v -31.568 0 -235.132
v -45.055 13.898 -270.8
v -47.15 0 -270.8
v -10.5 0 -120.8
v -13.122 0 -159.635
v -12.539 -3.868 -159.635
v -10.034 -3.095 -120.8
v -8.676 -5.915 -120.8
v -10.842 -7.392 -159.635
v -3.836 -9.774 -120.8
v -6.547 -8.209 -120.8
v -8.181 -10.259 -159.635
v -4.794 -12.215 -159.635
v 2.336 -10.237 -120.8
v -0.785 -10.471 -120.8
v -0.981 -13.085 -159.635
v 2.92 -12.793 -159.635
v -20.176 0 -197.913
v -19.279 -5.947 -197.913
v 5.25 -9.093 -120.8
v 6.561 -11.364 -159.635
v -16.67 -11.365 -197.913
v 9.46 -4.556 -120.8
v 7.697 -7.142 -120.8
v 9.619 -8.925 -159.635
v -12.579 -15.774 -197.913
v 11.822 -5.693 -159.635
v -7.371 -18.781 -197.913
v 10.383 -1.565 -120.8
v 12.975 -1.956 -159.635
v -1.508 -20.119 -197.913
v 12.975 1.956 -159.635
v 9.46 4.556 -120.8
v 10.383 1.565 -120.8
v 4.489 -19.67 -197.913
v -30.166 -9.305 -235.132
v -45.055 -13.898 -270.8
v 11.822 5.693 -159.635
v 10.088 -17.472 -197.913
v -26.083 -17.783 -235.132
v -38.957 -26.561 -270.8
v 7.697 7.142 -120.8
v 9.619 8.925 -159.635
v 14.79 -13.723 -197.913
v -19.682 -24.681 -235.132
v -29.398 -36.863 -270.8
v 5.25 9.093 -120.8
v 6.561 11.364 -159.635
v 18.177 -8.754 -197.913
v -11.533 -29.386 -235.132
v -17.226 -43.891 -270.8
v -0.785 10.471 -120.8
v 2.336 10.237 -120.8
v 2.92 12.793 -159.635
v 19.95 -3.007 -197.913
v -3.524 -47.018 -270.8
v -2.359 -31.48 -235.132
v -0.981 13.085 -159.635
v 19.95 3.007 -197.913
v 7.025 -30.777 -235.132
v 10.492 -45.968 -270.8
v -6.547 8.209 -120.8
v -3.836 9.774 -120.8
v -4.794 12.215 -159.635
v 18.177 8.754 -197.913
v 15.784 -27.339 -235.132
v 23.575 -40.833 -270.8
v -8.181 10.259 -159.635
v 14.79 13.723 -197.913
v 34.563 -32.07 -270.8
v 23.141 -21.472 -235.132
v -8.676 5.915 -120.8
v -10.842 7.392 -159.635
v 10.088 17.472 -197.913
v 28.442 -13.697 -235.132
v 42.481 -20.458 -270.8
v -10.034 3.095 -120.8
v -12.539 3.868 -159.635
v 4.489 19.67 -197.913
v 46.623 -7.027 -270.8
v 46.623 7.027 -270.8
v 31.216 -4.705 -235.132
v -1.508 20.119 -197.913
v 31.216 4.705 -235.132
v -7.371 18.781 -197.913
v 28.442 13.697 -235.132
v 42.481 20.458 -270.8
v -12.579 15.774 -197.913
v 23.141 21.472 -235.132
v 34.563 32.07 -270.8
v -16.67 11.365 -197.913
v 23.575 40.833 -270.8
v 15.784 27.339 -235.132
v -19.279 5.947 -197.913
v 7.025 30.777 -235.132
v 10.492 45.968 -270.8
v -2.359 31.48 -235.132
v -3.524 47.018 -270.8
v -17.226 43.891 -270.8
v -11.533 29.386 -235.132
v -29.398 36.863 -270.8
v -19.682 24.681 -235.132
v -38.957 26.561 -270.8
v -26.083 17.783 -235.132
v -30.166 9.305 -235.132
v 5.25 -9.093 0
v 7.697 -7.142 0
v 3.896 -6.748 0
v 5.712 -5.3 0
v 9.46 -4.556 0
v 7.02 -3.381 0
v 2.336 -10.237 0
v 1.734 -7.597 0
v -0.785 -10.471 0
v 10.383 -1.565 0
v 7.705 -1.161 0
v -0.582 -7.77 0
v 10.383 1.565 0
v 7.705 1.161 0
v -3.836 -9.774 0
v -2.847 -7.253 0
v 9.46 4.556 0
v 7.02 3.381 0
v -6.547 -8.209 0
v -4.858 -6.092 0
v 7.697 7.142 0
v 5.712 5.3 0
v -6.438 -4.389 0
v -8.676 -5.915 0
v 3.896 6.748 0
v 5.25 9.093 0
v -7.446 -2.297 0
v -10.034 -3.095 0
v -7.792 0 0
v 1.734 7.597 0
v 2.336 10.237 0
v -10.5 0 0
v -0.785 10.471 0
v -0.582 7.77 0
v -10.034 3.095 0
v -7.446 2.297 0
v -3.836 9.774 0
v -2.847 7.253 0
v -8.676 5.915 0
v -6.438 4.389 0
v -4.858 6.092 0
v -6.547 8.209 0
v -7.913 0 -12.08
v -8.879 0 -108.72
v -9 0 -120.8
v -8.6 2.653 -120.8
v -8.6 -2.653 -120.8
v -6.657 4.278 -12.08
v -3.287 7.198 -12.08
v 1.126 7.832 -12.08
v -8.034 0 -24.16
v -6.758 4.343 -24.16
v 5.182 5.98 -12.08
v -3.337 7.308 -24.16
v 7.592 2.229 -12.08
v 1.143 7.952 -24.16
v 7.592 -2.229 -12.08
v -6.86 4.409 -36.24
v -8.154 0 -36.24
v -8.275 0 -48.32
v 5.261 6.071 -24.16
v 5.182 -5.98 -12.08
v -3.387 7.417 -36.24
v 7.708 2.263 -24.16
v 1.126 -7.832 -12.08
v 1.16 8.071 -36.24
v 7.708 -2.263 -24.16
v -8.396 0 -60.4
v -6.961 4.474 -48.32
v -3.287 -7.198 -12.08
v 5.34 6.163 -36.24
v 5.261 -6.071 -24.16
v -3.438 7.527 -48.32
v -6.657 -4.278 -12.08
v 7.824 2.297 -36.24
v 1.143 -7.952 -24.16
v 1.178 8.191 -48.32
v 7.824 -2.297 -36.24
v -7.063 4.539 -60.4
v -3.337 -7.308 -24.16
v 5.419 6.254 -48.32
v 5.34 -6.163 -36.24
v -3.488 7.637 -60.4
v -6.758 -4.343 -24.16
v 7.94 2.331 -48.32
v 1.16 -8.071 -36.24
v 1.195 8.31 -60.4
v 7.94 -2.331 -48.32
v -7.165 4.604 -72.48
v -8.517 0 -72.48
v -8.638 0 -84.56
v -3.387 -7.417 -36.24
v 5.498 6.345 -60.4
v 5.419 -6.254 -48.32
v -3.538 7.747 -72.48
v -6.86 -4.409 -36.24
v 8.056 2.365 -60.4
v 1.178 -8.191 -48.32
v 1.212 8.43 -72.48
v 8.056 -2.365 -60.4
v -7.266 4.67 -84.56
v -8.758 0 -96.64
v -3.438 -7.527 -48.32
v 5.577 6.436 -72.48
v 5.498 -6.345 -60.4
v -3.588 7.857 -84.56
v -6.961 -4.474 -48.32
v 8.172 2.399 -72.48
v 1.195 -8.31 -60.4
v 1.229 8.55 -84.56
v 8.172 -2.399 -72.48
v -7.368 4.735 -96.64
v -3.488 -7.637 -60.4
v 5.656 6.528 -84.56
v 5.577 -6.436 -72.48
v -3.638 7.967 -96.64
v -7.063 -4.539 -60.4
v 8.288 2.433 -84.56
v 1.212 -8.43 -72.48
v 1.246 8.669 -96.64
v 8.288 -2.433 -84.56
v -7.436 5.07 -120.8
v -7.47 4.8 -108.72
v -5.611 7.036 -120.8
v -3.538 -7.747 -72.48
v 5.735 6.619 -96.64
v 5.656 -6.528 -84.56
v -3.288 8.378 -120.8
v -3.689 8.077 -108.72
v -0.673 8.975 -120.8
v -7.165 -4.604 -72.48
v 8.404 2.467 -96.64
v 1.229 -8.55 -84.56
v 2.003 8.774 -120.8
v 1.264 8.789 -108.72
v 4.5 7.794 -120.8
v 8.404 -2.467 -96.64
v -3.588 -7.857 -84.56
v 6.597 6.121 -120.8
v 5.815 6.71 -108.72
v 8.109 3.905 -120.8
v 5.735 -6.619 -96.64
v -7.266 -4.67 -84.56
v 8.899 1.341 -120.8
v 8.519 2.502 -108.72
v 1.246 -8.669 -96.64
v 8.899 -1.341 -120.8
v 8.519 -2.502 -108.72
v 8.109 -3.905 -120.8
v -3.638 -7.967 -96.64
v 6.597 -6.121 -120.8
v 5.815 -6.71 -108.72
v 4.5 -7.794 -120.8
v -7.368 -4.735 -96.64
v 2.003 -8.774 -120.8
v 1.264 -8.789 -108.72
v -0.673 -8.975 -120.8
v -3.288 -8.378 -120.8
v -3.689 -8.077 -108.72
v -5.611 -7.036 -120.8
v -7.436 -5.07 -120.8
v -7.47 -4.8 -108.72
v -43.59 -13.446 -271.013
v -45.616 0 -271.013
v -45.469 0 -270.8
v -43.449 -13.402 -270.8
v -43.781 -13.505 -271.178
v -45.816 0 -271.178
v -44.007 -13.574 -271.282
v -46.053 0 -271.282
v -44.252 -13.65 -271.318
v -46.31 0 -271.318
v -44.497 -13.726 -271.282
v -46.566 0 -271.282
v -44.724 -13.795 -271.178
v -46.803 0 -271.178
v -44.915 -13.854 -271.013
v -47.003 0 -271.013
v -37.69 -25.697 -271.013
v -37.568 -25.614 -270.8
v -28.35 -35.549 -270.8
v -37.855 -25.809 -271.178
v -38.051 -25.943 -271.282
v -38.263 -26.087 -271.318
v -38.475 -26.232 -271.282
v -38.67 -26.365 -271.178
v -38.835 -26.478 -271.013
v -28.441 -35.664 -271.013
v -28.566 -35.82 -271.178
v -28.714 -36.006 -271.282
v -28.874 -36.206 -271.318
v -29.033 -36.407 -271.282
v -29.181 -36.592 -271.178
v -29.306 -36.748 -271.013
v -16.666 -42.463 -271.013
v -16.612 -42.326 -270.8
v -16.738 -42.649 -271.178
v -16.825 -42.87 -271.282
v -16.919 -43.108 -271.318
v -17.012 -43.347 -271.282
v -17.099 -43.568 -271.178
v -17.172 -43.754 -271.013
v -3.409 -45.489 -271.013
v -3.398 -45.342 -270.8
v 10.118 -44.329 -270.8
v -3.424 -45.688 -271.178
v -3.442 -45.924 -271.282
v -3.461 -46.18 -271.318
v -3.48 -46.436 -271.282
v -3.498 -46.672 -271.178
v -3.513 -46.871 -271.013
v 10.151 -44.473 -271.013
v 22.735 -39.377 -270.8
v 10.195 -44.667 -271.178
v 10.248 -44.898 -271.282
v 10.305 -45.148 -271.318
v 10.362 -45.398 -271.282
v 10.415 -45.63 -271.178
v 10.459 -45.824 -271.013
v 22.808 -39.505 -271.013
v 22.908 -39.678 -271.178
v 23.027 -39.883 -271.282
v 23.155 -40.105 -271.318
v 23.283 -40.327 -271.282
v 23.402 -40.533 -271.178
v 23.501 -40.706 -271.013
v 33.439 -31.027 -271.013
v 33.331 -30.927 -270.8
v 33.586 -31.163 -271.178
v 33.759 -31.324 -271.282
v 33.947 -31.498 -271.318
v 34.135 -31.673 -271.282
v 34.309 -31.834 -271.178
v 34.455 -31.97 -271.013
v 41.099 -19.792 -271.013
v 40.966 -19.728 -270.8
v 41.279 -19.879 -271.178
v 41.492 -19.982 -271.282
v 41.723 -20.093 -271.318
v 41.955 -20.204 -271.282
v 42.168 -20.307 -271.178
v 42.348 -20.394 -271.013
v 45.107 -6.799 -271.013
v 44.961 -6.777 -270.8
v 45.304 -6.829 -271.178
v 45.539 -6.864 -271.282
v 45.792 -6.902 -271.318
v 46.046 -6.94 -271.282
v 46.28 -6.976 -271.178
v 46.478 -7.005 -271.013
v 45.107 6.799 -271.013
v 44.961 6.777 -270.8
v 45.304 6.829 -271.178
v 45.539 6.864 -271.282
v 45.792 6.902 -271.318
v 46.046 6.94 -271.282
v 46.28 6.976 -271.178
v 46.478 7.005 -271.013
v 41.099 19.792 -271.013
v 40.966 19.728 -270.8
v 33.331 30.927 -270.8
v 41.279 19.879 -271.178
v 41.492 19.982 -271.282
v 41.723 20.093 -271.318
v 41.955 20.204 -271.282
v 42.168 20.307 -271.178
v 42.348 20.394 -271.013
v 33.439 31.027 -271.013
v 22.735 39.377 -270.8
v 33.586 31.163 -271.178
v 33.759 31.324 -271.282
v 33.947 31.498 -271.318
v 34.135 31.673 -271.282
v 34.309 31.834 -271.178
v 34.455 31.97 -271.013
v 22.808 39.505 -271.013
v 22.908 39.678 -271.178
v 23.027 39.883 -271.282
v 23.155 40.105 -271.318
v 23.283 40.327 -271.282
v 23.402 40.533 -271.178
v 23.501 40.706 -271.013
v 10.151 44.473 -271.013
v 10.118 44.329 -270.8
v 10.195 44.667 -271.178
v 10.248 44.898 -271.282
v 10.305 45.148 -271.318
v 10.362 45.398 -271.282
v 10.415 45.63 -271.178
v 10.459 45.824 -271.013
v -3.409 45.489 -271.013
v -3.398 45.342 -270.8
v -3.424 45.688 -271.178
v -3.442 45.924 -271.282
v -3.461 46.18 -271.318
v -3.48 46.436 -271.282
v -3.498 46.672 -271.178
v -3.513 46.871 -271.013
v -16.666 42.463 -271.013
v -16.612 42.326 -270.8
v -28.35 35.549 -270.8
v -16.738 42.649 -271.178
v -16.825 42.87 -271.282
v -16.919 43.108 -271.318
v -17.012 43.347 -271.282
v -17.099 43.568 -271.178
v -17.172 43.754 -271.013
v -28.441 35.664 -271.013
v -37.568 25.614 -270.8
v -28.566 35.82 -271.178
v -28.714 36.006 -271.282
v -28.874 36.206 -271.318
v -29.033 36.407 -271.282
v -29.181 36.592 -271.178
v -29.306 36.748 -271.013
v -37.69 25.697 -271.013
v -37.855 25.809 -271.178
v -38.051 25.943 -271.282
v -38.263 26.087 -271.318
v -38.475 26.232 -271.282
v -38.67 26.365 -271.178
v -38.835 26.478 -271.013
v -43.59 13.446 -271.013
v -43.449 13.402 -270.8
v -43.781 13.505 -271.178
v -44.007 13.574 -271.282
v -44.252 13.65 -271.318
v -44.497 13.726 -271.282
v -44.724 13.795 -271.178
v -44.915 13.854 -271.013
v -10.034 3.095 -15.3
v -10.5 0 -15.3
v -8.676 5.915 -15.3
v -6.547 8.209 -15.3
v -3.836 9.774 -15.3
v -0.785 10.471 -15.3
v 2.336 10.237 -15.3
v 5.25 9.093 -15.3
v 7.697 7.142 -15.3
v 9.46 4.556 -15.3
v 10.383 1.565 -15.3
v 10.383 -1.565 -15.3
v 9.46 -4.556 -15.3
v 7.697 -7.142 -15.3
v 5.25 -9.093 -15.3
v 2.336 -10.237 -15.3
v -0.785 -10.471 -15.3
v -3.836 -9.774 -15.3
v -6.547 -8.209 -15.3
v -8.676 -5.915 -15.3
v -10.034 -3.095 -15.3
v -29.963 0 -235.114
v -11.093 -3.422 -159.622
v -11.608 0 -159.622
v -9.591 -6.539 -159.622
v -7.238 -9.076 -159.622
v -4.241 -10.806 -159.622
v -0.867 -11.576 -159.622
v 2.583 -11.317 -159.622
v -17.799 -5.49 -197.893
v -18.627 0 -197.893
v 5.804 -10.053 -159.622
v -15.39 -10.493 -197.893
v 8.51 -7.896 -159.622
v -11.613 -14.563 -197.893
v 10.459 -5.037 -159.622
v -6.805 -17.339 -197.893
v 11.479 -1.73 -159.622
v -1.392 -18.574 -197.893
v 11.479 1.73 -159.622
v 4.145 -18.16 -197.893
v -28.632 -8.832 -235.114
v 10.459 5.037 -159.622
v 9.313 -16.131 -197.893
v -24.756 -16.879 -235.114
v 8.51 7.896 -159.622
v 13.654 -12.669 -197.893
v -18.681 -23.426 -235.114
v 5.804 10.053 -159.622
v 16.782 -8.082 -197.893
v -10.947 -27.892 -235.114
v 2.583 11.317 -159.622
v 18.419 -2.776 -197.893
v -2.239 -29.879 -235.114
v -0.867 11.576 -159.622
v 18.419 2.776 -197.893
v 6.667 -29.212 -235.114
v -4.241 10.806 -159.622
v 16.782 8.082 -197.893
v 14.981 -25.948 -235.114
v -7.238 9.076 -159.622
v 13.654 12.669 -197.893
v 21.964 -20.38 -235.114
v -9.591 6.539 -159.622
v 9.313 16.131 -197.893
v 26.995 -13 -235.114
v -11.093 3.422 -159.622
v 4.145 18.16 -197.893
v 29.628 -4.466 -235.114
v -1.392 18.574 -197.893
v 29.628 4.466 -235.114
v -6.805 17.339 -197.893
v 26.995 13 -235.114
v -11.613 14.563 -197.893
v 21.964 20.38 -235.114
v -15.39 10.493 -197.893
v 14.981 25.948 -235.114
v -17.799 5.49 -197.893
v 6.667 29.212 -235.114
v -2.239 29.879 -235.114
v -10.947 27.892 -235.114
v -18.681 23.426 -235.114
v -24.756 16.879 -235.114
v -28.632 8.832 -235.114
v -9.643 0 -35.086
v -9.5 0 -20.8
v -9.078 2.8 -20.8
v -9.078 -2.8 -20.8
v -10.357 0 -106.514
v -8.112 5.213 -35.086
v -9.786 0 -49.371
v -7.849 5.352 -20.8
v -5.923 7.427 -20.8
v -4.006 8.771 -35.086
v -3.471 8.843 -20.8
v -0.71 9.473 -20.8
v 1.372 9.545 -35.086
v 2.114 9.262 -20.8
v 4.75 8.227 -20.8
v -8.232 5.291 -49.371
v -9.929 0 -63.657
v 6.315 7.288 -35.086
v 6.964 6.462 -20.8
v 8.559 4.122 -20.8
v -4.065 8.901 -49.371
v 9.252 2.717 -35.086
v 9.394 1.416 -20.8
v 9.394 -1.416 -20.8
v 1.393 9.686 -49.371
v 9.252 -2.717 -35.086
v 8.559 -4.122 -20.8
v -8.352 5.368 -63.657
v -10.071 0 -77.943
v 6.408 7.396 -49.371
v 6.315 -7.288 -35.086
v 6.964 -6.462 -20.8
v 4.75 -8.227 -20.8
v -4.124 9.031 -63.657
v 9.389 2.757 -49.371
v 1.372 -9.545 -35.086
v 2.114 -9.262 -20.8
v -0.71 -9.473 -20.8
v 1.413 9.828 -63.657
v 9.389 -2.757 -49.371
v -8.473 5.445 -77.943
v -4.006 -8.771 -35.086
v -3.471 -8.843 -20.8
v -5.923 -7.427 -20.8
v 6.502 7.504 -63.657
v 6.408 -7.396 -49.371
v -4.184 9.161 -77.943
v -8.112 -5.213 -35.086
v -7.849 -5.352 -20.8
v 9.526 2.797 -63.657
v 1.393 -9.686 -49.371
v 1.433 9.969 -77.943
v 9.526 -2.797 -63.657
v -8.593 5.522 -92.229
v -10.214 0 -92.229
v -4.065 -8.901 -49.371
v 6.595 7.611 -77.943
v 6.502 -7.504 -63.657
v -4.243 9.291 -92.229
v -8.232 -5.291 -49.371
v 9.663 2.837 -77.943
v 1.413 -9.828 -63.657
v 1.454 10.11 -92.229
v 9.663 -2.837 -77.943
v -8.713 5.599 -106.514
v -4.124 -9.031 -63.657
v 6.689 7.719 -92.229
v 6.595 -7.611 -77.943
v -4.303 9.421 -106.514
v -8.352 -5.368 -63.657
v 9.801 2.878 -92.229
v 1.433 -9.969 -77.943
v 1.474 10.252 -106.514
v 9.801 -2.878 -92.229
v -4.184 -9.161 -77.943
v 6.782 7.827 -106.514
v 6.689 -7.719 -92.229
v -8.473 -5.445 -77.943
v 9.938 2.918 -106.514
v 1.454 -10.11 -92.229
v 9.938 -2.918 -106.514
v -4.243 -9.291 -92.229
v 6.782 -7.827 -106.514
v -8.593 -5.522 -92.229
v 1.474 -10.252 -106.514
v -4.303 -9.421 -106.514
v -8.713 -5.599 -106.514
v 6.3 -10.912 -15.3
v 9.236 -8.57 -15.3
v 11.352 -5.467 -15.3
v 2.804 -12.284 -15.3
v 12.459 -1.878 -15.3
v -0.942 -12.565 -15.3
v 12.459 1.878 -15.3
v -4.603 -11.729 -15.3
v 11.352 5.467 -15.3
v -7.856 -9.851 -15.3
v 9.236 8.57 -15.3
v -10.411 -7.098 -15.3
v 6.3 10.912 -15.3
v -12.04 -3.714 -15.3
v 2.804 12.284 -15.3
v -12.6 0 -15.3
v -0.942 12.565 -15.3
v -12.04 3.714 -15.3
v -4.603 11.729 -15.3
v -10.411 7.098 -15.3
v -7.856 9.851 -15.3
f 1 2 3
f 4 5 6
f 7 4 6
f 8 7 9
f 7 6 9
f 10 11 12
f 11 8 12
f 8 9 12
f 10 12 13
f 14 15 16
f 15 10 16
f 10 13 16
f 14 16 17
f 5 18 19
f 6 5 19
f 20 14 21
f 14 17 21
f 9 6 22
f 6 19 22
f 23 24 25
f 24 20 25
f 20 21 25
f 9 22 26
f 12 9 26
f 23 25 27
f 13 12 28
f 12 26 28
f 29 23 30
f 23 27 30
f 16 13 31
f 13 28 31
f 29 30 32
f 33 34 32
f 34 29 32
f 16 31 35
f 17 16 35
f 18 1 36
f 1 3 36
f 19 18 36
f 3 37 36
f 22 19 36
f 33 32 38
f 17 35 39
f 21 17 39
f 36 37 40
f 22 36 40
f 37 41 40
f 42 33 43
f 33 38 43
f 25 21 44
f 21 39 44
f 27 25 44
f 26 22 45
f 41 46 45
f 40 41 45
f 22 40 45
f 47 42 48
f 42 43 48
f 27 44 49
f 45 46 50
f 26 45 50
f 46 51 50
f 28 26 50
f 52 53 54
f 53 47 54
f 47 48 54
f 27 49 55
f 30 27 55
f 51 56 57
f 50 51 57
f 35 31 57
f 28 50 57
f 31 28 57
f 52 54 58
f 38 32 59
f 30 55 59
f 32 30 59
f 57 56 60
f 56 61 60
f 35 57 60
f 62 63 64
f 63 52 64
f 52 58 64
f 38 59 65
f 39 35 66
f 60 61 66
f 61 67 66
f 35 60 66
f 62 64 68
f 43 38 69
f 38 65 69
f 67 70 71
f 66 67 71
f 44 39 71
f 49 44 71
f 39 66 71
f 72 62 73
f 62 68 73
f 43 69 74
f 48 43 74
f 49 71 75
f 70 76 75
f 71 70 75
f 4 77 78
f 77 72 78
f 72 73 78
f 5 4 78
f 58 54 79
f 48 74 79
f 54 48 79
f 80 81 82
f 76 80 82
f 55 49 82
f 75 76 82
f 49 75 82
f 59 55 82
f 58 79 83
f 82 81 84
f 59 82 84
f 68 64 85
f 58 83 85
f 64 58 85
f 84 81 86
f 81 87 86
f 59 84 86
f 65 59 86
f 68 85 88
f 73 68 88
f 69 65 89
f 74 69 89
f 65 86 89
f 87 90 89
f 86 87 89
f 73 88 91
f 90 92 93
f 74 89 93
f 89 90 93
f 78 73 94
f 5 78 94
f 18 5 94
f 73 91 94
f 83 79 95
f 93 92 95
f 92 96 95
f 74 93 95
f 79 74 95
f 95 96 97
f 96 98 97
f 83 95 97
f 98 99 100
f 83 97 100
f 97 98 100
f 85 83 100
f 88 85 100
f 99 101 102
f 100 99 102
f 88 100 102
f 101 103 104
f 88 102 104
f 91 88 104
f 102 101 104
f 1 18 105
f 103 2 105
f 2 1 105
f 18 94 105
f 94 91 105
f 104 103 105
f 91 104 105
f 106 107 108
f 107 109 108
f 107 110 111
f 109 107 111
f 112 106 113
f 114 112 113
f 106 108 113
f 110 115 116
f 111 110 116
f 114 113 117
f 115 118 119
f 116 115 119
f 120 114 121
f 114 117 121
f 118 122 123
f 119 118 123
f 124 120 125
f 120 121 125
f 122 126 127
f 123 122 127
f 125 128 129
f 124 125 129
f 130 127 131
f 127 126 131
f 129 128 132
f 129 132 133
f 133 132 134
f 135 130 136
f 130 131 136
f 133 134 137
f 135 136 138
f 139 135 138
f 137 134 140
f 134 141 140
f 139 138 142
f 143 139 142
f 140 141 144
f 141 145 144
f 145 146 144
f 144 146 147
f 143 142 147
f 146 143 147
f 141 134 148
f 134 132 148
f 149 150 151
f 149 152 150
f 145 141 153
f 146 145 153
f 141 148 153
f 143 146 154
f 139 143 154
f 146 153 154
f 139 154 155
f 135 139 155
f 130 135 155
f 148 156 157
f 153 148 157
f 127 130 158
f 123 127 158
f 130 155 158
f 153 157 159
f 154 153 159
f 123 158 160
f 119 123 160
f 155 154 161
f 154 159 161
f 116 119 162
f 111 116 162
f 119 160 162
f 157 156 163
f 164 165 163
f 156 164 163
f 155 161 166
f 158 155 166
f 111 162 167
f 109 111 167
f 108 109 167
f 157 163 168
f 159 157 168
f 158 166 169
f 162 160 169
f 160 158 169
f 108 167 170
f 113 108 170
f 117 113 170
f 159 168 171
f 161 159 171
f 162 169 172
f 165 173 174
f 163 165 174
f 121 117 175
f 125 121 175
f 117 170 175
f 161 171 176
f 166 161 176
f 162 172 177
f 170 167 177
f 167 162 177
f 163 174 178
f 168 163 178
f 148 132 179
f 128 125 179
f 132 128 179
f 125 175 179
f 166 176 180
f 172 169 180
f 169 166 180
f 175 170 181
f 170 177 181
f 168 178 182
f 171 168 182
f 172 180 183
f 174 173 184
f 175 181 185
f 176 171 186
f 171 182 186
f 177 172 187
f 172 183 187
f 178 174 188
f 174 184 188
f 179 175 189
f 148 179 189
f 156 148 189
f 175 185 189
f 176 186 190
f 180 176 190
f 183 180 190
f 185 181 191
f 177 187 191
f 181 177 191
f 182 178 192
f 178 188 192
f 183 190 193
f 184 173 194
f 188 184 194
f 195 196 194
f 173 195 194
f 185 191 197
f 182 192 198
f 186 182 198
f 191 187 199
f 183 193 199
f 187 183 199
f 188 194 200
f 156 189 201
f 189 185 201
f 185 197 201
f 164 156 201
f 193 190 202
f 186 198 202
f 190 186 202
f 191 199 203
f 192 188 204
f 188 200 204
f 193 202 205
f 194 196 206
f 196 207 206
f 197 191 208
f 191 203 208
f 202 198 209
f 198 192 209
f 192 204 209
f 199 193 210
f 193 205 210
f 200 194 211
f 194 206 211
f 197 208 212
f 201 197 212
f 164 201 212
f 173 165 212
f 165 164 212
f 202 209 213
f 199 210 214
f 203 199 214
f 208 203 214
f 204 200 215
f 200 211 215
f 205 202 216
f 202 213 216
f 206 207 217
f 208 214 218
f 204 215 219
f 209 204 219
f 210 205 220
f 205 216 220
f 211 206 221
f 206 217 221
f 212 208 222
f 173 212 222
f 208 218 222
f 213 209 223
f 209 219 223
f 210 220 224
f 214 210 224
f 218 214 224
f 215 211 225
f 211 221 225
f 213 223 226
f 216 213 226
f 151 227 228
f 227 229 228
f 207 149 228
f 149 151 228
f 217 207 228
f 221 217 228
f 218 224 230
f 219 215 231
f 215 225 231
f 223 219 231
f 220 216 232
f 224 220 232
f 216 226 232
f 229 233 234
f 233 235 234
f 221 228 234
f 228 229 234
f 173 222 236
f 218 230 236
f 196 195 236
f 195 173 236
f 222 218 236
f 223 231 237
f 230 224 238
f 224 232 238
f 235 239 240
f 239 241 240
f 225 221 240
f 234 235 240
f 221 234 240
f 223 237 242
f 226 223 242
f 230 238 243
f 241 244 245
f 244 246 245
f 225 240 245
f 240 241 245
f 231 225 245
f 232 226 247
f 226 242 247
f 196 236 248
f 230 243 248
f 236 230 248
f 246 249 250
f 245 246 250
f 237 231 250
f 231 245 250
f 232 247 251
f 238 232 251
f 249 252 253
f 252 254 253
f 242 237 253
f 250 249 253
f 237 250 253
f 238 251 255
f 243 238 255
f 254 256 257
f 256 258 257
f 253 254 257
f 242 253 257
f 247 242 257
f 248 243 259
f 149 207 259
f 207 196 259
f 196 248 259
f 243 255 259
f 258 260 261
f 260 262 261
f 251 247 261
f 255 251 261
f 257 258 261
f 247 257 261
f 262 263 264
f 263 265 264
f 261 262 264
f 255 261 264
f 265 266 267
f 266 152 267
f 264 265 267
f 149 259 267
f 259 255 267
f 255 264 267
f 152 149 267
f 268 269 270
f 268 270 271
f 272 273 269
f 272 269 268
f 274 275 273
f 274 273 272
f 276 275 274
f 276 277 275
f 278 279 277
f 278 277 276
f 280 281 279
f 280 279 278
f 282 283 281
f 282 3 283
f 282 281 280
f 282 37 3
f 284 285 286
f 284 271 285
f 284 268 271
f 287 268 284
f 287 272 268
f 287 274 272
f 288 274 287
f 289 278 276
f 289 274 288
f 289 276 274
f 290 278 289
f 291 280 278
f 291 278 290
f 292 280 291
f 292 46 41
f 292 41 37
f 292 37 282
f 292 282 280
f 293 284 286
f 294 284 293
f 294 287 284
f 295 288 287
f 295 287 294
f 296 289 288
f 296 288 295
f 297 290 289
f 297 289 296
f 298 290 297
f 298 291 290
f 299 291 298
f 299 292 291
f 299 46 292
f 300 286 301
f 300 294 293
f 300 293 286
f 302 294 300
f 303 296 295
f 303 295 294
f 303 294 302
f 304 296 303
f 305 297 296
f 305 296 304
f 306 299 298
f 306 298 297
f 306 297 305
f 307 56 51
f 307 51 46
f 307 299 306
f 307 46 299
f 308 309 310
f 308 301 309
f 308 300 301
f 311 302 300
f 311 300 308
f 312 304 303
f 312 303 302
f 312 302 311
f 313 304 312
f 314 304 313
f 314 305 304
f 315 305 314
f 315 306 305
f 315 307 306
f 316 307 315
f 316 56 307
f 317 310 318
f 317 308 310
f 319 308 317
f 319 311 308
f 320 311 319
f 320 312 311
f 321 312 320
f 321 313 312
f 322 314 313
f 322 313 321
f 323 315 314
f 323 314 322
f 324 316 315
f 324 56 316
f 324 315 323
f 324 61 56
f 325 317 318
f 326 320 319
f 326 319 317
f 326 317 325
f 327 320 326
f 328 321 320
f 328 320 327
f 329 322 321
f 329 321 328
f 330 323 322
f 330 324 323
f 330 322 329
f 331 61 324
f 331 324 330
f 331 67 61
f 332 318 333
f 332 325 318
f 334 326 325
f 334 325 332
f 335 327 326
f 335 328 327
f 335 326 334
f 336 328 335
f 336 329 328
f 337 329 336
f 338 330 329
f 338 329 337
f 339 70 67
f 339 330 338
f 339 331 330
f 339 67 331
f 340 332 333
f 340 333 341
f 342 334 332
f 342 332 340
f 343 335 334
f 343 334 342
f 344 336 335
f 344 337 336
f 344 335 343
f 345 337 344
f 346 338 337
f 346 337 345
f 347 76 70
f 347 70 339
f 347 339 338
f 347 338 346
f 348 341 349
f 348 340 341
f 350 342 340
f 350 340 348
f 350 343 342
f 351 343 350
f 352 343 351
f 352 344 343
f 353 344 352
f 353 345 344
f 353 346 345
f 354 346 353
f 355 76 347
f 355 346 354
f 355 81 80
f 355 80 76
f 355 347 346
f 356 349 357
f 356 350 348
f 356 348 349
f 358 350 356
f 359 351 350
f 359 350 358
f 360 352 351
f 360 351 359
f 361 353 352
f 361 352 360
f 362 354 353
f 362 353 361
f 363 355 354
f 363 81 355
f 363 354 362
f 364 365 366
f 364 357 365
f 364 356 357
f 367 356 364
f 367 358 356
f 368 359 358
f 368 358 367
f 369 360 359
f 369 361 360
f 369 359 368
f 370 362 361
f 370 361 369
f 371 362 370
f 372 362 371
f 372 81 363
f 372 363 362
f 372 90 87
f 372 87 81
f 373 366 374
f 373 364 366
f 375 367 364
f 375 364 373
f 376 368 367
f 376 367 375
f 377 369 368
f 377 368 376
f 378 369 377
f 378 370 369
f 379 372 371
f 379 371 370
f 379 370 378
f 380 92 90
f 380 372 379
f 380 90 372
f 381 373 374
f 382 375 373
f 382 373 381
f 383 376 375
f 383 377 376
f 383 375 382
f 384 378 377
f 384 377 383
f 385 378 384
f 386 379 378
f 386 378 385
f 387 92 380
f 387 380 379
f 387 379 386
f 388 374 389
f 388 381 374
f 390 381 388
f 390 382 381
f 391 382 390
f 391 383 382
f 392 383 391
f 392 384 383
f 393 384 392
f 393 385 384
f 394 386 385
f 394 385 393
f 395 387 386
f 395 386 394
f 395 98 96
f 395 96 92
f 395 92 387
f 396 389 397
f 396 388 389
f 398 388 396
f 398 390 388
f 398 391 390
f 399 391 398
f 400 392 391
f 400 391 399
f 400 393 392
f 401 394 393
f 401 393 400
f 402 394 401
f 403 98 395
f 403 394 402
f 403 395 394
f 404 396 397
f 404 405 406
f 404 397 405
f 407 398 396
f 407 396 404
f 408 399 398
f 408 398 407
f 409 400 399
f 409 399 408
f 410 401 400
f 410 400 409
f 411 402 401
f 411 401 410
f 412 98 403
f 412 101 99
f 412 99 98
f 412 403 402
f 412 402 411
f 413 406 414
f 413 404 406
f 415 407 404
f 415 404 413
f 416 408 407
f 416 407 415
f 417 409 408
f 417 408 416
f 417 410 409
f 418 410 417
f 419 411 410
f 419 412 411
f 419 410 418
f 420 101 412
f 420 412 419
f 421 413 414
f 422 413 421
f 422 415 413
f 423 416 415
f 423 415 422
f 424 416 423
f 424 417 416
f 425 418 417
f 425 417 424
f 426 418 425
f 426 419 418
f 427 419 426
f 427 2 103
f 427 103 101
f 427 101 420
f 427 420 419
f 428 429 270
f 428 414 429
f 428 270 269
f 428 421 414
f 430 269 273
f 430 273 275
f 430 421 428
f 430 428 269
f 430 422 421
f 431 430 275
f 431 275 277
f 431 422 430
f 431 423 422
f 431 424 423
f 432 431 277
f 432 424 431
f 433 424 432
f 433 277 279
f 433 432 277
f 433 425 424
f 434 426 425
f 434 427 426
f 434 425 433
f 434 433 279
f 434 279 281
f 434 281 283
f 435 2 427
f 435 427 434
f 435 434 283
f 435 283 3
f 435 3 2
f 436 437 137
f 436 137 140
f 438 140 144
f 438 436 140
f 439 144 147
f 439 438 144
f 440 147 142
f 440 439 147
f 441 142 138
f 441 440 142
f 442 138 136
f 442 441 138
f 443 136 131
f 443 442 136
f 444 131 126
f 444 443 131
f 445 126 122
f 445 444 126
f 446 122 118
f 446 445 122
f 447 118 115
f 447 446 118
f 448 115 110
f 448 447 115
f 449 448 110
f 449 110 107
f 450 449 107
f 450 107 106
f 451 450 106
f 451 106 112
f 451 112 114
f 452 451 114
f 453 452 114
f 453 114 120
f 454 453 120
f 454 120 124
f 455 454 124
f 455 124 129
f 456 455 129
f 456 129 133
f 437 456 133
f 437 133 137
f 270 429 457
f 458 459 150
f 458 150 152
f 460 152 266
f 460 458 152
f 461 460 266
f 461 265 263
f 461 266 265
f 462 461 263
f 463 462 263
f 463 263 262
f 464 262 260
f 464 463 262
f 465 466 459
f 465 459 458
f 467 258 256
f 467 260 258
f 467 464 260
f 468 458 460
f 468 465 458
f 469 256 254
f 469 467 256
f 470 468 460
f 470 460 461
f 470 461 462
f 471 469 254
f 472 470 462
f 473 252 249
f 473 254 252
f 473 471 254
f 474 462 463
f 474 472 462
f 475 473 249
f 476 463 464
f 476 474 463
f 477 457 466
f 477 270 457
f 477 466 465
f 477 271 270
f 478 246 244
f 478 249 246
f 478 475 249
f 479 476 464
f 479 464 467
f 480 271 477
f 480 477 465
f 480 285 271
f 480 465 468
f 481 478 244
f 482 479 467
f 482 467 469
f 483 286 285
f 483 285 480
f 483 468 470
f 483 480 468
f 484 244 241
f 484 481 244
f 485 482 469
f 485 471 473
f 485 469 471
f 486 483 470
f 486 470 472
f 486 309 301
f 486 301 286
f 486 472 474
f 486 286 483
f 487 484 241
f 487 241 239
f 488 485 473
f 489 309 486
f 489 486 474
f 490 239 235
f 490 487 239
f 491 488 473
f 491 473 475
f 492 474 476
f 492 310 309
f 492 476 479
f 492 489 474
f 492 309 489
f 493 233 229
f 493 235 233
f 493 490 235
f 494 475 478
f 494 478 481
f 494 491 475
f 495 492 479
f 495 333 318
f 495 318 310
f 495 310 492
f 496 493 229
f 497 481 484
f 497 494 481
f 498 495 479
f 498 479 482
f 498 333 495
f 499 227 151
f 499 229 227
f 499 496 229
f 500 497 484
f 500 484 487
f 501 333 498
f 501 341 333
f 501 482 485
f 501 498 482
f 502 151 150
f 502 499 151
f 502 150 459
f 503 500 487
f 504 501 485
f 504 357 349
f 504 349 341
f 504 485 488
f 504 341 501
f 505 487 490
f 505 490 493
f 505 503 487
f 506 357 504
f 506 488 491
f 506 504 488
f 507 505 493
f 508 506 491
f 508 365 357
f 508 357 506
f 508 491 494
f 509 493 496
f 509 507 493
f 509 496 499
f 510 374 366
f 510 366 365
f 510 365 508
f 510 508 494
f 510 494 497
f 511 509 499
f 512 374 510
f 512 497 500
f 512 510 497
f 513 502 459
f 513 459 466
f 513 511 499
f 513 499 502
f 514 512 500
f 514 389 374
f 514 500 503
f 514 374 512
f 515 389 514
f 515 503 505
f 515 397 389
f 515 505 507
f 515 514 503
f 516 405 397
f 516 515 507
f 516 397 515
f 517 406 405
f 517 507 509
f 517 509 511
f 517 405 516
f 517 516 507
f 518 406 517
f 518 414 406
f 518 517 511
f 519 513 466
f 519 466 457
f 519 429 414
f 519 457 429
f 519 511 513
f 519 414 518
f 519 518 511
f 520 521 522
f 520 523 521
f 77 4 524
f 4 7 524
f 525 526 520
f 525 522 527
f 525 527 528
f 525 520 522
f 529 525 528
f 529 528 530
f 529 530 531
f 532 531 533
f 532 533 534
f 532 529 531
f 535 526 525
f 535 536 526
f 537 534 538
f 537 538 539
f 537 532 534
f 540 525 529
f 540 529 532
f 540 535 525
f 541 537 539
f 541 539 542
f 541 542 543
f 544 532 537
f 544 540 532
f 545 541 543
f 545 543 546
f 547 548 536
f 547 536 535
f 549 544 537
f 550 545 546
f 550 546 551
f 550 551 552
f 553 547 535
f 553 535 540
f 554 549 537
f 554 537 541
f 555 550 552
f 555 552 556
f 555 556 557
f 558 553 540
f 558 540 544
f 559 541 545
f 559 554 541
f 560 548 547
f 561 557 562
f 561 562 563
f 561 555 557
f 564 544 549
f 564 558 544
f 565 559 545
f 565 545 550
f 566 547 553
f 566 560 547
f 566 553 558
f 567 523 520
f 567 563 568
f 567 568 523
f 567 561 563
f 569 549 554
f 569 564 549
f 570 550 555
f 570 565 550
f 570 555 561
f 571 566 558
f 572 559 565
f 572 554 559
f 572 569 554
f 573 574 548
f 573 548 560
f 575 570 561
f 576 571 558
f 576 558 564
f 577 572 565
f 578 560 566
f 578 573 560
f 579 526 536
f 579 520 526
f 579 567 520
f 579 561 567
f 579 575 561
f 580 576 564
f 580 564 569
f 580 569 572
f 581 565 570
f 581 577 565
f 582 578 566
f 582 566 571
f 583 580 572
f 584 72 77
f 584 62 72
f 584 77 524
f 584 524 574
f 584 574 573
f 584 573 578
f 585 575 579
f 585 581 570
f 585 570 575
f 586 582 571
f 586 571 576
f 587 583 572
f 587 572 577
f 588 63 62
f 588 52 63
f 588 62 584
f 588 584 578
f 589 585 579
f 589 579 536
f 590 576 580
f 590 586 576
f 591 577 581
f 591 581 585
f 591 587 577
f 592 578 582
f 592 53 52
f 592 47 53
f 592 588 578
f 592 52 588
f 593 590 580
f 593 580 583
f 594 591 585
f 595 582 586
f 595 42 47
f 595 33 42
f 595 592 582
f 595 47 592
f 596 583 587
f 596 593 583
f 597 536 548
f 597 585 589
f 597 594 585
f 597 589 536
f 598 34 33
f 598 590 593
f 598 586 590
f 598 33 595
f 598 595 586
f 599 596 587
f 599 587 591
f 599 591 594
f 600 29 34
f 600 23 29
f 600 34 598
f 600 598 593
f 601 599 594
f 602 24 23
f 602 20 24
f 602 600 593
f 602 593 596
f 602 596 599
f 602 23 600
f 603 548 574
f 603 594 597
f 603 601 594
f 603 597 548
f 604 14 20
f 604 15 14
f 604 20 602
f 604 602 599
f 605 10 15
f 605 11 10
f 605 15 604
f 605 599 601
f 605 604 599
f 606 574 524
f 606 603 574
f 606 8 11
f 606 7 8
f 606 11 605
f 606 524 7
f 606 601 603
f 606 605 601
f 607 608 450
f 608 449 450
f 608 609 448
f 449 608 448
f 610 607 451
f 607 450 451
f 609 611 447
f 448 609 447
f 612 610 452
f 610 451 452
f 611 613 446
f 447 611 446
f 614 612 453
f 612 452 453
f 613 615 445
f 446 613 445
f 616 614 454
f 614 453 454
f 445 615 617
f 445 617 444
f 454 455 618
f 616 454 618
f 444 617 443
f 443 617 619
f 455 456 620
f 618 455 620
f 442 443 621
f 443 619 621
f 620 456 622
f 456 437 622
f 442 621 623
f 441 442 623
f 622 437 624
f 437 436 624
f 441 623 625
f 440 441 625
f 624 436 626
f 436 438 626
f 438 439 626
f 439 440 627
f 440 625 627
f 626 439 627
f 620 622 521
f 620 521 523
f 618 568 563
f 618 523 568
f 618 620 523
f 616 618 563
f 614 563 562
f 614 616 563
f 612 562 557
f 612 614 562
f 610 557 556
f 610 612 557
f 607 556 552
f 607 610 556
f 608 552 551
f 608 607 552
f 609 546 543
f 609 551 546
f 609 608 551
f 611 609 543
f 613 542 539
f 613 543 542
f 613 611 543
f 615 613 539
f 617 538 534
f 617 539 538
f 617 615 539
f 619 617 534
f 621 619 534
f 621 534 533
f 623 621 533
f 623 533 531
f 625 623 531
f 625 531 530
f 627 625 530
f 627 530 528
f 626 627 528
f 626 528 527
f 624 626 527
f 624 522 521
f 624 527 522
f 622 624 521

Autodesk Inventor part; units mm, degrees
ref_plane "YZ Plane" through (0, 0, 0) normal (1, 0, 0) x (0, 1, 0)
ref_plane "XZ Plane" through (0, 0, 0) normal (0, 1, 0) x (-1, 0, 0)
ref_plane "XY Plane" through (0, 0, 0) normal (0, 0, 1) x (1, 0, 0)
sketch "Sketch1" plane through (0, 0, 0) normal (0, 1, 0) x (-1, 0, 0)
  line L0 (0, 0) -> (0, -270.8) construction
  line L1 (0, -270.8) -> (47.15, -270.8) construction
  line L2 (0, -120.8) -> (10.5, -120.8) construction
  line L3 (0, -20.8) -> (9.5, -20.8) construction
  line L4 (0, -15.3) -> (12.6, -15.3) construction
  line L5 (0, 0) -> (10.5, 0) construction
  line L6 (10.5, 0) -> (10.5, -15.3)
  line L7 (10.5, -15.3) -> (12.6, -15.3)
  line L8 (12.6, -15.3) -> (9.5, -20.8)
  line L9 (10.5, -120.8) -> (9.5, -20.8)
  arc A0 (10.5, -120.8) -> (47.15, -270.8) centre (349.6639, -117.4084) ccw
  arc A1 (8.9999, -120.8) -> (45.4691, -270.8) centre (349.6639, -117.4084) ccw
  line L10 (8.9999, -120.8) -> (7.7919, 0)
  line L11 (10.5, 0) -> (7.7919, 0)
  arc A2 (45.4691, -270.8) -> (47.15, -270.8) centre (46.3096, -270.3762) ccw
  dimension "d0" = 15.3
  dimension "d1" = 5.5
  dimension "d2" = 100
  dimension "d3" = 150
  dimension "d4" = 47.15
  dimension "d5" = 10.5
  dimension "d6" = 9.5
  dimension "d7" = 12.6
  dimension "d8" = 10.5
  dimension "d9" = 1.5
revolve "Revolution1" add sketch "Sketch1" angle 360 about axis through (0, 0, 0) along (0, 0, -1)
thread "Thread1" size "M22x3" class "6g" standard "ANSI Metric M Profile" full length
equation "\"d0\" = Mount_Length"
equation "\"d1\" = Mount_Flange_Length"
equation "\"d2\" = Transition_Length"
equation "\"d3\" = Flare_Length"
equation "\"d4\" = Flare_Diameter"
equation "\"d5\" = Transition_Diameter"
equation "\"d6\" = Tail_Diameter"
equation "\"d7\" = Mount_Flange_Diameter"
equation "\"d8\" = Mount_Diameter"
equation "\"d9\" = Bell_Thickness"
equation "\"Transition_Length\" = 100"
equation "\"Mount_Length\" = 15.3"
equation "\"Mount_Flange_Length\" = 5.5"
equation "\"Flare_Length\" = 150"
equation "\"Flare_Diameter\" = 47.15"
equation "\"Transition_Diameter\" = 10.5"
equation "\"Tail_Diameter\" = 9.5"
equation "\"Mount_Flange_Diameter\" = 12.6"
equation "\"Mount_Diameter\" = 10.5"
equation "\"Bell_Thickness\" = 1.5"
properties part number "Horn_B" material "Steel, Cast"
